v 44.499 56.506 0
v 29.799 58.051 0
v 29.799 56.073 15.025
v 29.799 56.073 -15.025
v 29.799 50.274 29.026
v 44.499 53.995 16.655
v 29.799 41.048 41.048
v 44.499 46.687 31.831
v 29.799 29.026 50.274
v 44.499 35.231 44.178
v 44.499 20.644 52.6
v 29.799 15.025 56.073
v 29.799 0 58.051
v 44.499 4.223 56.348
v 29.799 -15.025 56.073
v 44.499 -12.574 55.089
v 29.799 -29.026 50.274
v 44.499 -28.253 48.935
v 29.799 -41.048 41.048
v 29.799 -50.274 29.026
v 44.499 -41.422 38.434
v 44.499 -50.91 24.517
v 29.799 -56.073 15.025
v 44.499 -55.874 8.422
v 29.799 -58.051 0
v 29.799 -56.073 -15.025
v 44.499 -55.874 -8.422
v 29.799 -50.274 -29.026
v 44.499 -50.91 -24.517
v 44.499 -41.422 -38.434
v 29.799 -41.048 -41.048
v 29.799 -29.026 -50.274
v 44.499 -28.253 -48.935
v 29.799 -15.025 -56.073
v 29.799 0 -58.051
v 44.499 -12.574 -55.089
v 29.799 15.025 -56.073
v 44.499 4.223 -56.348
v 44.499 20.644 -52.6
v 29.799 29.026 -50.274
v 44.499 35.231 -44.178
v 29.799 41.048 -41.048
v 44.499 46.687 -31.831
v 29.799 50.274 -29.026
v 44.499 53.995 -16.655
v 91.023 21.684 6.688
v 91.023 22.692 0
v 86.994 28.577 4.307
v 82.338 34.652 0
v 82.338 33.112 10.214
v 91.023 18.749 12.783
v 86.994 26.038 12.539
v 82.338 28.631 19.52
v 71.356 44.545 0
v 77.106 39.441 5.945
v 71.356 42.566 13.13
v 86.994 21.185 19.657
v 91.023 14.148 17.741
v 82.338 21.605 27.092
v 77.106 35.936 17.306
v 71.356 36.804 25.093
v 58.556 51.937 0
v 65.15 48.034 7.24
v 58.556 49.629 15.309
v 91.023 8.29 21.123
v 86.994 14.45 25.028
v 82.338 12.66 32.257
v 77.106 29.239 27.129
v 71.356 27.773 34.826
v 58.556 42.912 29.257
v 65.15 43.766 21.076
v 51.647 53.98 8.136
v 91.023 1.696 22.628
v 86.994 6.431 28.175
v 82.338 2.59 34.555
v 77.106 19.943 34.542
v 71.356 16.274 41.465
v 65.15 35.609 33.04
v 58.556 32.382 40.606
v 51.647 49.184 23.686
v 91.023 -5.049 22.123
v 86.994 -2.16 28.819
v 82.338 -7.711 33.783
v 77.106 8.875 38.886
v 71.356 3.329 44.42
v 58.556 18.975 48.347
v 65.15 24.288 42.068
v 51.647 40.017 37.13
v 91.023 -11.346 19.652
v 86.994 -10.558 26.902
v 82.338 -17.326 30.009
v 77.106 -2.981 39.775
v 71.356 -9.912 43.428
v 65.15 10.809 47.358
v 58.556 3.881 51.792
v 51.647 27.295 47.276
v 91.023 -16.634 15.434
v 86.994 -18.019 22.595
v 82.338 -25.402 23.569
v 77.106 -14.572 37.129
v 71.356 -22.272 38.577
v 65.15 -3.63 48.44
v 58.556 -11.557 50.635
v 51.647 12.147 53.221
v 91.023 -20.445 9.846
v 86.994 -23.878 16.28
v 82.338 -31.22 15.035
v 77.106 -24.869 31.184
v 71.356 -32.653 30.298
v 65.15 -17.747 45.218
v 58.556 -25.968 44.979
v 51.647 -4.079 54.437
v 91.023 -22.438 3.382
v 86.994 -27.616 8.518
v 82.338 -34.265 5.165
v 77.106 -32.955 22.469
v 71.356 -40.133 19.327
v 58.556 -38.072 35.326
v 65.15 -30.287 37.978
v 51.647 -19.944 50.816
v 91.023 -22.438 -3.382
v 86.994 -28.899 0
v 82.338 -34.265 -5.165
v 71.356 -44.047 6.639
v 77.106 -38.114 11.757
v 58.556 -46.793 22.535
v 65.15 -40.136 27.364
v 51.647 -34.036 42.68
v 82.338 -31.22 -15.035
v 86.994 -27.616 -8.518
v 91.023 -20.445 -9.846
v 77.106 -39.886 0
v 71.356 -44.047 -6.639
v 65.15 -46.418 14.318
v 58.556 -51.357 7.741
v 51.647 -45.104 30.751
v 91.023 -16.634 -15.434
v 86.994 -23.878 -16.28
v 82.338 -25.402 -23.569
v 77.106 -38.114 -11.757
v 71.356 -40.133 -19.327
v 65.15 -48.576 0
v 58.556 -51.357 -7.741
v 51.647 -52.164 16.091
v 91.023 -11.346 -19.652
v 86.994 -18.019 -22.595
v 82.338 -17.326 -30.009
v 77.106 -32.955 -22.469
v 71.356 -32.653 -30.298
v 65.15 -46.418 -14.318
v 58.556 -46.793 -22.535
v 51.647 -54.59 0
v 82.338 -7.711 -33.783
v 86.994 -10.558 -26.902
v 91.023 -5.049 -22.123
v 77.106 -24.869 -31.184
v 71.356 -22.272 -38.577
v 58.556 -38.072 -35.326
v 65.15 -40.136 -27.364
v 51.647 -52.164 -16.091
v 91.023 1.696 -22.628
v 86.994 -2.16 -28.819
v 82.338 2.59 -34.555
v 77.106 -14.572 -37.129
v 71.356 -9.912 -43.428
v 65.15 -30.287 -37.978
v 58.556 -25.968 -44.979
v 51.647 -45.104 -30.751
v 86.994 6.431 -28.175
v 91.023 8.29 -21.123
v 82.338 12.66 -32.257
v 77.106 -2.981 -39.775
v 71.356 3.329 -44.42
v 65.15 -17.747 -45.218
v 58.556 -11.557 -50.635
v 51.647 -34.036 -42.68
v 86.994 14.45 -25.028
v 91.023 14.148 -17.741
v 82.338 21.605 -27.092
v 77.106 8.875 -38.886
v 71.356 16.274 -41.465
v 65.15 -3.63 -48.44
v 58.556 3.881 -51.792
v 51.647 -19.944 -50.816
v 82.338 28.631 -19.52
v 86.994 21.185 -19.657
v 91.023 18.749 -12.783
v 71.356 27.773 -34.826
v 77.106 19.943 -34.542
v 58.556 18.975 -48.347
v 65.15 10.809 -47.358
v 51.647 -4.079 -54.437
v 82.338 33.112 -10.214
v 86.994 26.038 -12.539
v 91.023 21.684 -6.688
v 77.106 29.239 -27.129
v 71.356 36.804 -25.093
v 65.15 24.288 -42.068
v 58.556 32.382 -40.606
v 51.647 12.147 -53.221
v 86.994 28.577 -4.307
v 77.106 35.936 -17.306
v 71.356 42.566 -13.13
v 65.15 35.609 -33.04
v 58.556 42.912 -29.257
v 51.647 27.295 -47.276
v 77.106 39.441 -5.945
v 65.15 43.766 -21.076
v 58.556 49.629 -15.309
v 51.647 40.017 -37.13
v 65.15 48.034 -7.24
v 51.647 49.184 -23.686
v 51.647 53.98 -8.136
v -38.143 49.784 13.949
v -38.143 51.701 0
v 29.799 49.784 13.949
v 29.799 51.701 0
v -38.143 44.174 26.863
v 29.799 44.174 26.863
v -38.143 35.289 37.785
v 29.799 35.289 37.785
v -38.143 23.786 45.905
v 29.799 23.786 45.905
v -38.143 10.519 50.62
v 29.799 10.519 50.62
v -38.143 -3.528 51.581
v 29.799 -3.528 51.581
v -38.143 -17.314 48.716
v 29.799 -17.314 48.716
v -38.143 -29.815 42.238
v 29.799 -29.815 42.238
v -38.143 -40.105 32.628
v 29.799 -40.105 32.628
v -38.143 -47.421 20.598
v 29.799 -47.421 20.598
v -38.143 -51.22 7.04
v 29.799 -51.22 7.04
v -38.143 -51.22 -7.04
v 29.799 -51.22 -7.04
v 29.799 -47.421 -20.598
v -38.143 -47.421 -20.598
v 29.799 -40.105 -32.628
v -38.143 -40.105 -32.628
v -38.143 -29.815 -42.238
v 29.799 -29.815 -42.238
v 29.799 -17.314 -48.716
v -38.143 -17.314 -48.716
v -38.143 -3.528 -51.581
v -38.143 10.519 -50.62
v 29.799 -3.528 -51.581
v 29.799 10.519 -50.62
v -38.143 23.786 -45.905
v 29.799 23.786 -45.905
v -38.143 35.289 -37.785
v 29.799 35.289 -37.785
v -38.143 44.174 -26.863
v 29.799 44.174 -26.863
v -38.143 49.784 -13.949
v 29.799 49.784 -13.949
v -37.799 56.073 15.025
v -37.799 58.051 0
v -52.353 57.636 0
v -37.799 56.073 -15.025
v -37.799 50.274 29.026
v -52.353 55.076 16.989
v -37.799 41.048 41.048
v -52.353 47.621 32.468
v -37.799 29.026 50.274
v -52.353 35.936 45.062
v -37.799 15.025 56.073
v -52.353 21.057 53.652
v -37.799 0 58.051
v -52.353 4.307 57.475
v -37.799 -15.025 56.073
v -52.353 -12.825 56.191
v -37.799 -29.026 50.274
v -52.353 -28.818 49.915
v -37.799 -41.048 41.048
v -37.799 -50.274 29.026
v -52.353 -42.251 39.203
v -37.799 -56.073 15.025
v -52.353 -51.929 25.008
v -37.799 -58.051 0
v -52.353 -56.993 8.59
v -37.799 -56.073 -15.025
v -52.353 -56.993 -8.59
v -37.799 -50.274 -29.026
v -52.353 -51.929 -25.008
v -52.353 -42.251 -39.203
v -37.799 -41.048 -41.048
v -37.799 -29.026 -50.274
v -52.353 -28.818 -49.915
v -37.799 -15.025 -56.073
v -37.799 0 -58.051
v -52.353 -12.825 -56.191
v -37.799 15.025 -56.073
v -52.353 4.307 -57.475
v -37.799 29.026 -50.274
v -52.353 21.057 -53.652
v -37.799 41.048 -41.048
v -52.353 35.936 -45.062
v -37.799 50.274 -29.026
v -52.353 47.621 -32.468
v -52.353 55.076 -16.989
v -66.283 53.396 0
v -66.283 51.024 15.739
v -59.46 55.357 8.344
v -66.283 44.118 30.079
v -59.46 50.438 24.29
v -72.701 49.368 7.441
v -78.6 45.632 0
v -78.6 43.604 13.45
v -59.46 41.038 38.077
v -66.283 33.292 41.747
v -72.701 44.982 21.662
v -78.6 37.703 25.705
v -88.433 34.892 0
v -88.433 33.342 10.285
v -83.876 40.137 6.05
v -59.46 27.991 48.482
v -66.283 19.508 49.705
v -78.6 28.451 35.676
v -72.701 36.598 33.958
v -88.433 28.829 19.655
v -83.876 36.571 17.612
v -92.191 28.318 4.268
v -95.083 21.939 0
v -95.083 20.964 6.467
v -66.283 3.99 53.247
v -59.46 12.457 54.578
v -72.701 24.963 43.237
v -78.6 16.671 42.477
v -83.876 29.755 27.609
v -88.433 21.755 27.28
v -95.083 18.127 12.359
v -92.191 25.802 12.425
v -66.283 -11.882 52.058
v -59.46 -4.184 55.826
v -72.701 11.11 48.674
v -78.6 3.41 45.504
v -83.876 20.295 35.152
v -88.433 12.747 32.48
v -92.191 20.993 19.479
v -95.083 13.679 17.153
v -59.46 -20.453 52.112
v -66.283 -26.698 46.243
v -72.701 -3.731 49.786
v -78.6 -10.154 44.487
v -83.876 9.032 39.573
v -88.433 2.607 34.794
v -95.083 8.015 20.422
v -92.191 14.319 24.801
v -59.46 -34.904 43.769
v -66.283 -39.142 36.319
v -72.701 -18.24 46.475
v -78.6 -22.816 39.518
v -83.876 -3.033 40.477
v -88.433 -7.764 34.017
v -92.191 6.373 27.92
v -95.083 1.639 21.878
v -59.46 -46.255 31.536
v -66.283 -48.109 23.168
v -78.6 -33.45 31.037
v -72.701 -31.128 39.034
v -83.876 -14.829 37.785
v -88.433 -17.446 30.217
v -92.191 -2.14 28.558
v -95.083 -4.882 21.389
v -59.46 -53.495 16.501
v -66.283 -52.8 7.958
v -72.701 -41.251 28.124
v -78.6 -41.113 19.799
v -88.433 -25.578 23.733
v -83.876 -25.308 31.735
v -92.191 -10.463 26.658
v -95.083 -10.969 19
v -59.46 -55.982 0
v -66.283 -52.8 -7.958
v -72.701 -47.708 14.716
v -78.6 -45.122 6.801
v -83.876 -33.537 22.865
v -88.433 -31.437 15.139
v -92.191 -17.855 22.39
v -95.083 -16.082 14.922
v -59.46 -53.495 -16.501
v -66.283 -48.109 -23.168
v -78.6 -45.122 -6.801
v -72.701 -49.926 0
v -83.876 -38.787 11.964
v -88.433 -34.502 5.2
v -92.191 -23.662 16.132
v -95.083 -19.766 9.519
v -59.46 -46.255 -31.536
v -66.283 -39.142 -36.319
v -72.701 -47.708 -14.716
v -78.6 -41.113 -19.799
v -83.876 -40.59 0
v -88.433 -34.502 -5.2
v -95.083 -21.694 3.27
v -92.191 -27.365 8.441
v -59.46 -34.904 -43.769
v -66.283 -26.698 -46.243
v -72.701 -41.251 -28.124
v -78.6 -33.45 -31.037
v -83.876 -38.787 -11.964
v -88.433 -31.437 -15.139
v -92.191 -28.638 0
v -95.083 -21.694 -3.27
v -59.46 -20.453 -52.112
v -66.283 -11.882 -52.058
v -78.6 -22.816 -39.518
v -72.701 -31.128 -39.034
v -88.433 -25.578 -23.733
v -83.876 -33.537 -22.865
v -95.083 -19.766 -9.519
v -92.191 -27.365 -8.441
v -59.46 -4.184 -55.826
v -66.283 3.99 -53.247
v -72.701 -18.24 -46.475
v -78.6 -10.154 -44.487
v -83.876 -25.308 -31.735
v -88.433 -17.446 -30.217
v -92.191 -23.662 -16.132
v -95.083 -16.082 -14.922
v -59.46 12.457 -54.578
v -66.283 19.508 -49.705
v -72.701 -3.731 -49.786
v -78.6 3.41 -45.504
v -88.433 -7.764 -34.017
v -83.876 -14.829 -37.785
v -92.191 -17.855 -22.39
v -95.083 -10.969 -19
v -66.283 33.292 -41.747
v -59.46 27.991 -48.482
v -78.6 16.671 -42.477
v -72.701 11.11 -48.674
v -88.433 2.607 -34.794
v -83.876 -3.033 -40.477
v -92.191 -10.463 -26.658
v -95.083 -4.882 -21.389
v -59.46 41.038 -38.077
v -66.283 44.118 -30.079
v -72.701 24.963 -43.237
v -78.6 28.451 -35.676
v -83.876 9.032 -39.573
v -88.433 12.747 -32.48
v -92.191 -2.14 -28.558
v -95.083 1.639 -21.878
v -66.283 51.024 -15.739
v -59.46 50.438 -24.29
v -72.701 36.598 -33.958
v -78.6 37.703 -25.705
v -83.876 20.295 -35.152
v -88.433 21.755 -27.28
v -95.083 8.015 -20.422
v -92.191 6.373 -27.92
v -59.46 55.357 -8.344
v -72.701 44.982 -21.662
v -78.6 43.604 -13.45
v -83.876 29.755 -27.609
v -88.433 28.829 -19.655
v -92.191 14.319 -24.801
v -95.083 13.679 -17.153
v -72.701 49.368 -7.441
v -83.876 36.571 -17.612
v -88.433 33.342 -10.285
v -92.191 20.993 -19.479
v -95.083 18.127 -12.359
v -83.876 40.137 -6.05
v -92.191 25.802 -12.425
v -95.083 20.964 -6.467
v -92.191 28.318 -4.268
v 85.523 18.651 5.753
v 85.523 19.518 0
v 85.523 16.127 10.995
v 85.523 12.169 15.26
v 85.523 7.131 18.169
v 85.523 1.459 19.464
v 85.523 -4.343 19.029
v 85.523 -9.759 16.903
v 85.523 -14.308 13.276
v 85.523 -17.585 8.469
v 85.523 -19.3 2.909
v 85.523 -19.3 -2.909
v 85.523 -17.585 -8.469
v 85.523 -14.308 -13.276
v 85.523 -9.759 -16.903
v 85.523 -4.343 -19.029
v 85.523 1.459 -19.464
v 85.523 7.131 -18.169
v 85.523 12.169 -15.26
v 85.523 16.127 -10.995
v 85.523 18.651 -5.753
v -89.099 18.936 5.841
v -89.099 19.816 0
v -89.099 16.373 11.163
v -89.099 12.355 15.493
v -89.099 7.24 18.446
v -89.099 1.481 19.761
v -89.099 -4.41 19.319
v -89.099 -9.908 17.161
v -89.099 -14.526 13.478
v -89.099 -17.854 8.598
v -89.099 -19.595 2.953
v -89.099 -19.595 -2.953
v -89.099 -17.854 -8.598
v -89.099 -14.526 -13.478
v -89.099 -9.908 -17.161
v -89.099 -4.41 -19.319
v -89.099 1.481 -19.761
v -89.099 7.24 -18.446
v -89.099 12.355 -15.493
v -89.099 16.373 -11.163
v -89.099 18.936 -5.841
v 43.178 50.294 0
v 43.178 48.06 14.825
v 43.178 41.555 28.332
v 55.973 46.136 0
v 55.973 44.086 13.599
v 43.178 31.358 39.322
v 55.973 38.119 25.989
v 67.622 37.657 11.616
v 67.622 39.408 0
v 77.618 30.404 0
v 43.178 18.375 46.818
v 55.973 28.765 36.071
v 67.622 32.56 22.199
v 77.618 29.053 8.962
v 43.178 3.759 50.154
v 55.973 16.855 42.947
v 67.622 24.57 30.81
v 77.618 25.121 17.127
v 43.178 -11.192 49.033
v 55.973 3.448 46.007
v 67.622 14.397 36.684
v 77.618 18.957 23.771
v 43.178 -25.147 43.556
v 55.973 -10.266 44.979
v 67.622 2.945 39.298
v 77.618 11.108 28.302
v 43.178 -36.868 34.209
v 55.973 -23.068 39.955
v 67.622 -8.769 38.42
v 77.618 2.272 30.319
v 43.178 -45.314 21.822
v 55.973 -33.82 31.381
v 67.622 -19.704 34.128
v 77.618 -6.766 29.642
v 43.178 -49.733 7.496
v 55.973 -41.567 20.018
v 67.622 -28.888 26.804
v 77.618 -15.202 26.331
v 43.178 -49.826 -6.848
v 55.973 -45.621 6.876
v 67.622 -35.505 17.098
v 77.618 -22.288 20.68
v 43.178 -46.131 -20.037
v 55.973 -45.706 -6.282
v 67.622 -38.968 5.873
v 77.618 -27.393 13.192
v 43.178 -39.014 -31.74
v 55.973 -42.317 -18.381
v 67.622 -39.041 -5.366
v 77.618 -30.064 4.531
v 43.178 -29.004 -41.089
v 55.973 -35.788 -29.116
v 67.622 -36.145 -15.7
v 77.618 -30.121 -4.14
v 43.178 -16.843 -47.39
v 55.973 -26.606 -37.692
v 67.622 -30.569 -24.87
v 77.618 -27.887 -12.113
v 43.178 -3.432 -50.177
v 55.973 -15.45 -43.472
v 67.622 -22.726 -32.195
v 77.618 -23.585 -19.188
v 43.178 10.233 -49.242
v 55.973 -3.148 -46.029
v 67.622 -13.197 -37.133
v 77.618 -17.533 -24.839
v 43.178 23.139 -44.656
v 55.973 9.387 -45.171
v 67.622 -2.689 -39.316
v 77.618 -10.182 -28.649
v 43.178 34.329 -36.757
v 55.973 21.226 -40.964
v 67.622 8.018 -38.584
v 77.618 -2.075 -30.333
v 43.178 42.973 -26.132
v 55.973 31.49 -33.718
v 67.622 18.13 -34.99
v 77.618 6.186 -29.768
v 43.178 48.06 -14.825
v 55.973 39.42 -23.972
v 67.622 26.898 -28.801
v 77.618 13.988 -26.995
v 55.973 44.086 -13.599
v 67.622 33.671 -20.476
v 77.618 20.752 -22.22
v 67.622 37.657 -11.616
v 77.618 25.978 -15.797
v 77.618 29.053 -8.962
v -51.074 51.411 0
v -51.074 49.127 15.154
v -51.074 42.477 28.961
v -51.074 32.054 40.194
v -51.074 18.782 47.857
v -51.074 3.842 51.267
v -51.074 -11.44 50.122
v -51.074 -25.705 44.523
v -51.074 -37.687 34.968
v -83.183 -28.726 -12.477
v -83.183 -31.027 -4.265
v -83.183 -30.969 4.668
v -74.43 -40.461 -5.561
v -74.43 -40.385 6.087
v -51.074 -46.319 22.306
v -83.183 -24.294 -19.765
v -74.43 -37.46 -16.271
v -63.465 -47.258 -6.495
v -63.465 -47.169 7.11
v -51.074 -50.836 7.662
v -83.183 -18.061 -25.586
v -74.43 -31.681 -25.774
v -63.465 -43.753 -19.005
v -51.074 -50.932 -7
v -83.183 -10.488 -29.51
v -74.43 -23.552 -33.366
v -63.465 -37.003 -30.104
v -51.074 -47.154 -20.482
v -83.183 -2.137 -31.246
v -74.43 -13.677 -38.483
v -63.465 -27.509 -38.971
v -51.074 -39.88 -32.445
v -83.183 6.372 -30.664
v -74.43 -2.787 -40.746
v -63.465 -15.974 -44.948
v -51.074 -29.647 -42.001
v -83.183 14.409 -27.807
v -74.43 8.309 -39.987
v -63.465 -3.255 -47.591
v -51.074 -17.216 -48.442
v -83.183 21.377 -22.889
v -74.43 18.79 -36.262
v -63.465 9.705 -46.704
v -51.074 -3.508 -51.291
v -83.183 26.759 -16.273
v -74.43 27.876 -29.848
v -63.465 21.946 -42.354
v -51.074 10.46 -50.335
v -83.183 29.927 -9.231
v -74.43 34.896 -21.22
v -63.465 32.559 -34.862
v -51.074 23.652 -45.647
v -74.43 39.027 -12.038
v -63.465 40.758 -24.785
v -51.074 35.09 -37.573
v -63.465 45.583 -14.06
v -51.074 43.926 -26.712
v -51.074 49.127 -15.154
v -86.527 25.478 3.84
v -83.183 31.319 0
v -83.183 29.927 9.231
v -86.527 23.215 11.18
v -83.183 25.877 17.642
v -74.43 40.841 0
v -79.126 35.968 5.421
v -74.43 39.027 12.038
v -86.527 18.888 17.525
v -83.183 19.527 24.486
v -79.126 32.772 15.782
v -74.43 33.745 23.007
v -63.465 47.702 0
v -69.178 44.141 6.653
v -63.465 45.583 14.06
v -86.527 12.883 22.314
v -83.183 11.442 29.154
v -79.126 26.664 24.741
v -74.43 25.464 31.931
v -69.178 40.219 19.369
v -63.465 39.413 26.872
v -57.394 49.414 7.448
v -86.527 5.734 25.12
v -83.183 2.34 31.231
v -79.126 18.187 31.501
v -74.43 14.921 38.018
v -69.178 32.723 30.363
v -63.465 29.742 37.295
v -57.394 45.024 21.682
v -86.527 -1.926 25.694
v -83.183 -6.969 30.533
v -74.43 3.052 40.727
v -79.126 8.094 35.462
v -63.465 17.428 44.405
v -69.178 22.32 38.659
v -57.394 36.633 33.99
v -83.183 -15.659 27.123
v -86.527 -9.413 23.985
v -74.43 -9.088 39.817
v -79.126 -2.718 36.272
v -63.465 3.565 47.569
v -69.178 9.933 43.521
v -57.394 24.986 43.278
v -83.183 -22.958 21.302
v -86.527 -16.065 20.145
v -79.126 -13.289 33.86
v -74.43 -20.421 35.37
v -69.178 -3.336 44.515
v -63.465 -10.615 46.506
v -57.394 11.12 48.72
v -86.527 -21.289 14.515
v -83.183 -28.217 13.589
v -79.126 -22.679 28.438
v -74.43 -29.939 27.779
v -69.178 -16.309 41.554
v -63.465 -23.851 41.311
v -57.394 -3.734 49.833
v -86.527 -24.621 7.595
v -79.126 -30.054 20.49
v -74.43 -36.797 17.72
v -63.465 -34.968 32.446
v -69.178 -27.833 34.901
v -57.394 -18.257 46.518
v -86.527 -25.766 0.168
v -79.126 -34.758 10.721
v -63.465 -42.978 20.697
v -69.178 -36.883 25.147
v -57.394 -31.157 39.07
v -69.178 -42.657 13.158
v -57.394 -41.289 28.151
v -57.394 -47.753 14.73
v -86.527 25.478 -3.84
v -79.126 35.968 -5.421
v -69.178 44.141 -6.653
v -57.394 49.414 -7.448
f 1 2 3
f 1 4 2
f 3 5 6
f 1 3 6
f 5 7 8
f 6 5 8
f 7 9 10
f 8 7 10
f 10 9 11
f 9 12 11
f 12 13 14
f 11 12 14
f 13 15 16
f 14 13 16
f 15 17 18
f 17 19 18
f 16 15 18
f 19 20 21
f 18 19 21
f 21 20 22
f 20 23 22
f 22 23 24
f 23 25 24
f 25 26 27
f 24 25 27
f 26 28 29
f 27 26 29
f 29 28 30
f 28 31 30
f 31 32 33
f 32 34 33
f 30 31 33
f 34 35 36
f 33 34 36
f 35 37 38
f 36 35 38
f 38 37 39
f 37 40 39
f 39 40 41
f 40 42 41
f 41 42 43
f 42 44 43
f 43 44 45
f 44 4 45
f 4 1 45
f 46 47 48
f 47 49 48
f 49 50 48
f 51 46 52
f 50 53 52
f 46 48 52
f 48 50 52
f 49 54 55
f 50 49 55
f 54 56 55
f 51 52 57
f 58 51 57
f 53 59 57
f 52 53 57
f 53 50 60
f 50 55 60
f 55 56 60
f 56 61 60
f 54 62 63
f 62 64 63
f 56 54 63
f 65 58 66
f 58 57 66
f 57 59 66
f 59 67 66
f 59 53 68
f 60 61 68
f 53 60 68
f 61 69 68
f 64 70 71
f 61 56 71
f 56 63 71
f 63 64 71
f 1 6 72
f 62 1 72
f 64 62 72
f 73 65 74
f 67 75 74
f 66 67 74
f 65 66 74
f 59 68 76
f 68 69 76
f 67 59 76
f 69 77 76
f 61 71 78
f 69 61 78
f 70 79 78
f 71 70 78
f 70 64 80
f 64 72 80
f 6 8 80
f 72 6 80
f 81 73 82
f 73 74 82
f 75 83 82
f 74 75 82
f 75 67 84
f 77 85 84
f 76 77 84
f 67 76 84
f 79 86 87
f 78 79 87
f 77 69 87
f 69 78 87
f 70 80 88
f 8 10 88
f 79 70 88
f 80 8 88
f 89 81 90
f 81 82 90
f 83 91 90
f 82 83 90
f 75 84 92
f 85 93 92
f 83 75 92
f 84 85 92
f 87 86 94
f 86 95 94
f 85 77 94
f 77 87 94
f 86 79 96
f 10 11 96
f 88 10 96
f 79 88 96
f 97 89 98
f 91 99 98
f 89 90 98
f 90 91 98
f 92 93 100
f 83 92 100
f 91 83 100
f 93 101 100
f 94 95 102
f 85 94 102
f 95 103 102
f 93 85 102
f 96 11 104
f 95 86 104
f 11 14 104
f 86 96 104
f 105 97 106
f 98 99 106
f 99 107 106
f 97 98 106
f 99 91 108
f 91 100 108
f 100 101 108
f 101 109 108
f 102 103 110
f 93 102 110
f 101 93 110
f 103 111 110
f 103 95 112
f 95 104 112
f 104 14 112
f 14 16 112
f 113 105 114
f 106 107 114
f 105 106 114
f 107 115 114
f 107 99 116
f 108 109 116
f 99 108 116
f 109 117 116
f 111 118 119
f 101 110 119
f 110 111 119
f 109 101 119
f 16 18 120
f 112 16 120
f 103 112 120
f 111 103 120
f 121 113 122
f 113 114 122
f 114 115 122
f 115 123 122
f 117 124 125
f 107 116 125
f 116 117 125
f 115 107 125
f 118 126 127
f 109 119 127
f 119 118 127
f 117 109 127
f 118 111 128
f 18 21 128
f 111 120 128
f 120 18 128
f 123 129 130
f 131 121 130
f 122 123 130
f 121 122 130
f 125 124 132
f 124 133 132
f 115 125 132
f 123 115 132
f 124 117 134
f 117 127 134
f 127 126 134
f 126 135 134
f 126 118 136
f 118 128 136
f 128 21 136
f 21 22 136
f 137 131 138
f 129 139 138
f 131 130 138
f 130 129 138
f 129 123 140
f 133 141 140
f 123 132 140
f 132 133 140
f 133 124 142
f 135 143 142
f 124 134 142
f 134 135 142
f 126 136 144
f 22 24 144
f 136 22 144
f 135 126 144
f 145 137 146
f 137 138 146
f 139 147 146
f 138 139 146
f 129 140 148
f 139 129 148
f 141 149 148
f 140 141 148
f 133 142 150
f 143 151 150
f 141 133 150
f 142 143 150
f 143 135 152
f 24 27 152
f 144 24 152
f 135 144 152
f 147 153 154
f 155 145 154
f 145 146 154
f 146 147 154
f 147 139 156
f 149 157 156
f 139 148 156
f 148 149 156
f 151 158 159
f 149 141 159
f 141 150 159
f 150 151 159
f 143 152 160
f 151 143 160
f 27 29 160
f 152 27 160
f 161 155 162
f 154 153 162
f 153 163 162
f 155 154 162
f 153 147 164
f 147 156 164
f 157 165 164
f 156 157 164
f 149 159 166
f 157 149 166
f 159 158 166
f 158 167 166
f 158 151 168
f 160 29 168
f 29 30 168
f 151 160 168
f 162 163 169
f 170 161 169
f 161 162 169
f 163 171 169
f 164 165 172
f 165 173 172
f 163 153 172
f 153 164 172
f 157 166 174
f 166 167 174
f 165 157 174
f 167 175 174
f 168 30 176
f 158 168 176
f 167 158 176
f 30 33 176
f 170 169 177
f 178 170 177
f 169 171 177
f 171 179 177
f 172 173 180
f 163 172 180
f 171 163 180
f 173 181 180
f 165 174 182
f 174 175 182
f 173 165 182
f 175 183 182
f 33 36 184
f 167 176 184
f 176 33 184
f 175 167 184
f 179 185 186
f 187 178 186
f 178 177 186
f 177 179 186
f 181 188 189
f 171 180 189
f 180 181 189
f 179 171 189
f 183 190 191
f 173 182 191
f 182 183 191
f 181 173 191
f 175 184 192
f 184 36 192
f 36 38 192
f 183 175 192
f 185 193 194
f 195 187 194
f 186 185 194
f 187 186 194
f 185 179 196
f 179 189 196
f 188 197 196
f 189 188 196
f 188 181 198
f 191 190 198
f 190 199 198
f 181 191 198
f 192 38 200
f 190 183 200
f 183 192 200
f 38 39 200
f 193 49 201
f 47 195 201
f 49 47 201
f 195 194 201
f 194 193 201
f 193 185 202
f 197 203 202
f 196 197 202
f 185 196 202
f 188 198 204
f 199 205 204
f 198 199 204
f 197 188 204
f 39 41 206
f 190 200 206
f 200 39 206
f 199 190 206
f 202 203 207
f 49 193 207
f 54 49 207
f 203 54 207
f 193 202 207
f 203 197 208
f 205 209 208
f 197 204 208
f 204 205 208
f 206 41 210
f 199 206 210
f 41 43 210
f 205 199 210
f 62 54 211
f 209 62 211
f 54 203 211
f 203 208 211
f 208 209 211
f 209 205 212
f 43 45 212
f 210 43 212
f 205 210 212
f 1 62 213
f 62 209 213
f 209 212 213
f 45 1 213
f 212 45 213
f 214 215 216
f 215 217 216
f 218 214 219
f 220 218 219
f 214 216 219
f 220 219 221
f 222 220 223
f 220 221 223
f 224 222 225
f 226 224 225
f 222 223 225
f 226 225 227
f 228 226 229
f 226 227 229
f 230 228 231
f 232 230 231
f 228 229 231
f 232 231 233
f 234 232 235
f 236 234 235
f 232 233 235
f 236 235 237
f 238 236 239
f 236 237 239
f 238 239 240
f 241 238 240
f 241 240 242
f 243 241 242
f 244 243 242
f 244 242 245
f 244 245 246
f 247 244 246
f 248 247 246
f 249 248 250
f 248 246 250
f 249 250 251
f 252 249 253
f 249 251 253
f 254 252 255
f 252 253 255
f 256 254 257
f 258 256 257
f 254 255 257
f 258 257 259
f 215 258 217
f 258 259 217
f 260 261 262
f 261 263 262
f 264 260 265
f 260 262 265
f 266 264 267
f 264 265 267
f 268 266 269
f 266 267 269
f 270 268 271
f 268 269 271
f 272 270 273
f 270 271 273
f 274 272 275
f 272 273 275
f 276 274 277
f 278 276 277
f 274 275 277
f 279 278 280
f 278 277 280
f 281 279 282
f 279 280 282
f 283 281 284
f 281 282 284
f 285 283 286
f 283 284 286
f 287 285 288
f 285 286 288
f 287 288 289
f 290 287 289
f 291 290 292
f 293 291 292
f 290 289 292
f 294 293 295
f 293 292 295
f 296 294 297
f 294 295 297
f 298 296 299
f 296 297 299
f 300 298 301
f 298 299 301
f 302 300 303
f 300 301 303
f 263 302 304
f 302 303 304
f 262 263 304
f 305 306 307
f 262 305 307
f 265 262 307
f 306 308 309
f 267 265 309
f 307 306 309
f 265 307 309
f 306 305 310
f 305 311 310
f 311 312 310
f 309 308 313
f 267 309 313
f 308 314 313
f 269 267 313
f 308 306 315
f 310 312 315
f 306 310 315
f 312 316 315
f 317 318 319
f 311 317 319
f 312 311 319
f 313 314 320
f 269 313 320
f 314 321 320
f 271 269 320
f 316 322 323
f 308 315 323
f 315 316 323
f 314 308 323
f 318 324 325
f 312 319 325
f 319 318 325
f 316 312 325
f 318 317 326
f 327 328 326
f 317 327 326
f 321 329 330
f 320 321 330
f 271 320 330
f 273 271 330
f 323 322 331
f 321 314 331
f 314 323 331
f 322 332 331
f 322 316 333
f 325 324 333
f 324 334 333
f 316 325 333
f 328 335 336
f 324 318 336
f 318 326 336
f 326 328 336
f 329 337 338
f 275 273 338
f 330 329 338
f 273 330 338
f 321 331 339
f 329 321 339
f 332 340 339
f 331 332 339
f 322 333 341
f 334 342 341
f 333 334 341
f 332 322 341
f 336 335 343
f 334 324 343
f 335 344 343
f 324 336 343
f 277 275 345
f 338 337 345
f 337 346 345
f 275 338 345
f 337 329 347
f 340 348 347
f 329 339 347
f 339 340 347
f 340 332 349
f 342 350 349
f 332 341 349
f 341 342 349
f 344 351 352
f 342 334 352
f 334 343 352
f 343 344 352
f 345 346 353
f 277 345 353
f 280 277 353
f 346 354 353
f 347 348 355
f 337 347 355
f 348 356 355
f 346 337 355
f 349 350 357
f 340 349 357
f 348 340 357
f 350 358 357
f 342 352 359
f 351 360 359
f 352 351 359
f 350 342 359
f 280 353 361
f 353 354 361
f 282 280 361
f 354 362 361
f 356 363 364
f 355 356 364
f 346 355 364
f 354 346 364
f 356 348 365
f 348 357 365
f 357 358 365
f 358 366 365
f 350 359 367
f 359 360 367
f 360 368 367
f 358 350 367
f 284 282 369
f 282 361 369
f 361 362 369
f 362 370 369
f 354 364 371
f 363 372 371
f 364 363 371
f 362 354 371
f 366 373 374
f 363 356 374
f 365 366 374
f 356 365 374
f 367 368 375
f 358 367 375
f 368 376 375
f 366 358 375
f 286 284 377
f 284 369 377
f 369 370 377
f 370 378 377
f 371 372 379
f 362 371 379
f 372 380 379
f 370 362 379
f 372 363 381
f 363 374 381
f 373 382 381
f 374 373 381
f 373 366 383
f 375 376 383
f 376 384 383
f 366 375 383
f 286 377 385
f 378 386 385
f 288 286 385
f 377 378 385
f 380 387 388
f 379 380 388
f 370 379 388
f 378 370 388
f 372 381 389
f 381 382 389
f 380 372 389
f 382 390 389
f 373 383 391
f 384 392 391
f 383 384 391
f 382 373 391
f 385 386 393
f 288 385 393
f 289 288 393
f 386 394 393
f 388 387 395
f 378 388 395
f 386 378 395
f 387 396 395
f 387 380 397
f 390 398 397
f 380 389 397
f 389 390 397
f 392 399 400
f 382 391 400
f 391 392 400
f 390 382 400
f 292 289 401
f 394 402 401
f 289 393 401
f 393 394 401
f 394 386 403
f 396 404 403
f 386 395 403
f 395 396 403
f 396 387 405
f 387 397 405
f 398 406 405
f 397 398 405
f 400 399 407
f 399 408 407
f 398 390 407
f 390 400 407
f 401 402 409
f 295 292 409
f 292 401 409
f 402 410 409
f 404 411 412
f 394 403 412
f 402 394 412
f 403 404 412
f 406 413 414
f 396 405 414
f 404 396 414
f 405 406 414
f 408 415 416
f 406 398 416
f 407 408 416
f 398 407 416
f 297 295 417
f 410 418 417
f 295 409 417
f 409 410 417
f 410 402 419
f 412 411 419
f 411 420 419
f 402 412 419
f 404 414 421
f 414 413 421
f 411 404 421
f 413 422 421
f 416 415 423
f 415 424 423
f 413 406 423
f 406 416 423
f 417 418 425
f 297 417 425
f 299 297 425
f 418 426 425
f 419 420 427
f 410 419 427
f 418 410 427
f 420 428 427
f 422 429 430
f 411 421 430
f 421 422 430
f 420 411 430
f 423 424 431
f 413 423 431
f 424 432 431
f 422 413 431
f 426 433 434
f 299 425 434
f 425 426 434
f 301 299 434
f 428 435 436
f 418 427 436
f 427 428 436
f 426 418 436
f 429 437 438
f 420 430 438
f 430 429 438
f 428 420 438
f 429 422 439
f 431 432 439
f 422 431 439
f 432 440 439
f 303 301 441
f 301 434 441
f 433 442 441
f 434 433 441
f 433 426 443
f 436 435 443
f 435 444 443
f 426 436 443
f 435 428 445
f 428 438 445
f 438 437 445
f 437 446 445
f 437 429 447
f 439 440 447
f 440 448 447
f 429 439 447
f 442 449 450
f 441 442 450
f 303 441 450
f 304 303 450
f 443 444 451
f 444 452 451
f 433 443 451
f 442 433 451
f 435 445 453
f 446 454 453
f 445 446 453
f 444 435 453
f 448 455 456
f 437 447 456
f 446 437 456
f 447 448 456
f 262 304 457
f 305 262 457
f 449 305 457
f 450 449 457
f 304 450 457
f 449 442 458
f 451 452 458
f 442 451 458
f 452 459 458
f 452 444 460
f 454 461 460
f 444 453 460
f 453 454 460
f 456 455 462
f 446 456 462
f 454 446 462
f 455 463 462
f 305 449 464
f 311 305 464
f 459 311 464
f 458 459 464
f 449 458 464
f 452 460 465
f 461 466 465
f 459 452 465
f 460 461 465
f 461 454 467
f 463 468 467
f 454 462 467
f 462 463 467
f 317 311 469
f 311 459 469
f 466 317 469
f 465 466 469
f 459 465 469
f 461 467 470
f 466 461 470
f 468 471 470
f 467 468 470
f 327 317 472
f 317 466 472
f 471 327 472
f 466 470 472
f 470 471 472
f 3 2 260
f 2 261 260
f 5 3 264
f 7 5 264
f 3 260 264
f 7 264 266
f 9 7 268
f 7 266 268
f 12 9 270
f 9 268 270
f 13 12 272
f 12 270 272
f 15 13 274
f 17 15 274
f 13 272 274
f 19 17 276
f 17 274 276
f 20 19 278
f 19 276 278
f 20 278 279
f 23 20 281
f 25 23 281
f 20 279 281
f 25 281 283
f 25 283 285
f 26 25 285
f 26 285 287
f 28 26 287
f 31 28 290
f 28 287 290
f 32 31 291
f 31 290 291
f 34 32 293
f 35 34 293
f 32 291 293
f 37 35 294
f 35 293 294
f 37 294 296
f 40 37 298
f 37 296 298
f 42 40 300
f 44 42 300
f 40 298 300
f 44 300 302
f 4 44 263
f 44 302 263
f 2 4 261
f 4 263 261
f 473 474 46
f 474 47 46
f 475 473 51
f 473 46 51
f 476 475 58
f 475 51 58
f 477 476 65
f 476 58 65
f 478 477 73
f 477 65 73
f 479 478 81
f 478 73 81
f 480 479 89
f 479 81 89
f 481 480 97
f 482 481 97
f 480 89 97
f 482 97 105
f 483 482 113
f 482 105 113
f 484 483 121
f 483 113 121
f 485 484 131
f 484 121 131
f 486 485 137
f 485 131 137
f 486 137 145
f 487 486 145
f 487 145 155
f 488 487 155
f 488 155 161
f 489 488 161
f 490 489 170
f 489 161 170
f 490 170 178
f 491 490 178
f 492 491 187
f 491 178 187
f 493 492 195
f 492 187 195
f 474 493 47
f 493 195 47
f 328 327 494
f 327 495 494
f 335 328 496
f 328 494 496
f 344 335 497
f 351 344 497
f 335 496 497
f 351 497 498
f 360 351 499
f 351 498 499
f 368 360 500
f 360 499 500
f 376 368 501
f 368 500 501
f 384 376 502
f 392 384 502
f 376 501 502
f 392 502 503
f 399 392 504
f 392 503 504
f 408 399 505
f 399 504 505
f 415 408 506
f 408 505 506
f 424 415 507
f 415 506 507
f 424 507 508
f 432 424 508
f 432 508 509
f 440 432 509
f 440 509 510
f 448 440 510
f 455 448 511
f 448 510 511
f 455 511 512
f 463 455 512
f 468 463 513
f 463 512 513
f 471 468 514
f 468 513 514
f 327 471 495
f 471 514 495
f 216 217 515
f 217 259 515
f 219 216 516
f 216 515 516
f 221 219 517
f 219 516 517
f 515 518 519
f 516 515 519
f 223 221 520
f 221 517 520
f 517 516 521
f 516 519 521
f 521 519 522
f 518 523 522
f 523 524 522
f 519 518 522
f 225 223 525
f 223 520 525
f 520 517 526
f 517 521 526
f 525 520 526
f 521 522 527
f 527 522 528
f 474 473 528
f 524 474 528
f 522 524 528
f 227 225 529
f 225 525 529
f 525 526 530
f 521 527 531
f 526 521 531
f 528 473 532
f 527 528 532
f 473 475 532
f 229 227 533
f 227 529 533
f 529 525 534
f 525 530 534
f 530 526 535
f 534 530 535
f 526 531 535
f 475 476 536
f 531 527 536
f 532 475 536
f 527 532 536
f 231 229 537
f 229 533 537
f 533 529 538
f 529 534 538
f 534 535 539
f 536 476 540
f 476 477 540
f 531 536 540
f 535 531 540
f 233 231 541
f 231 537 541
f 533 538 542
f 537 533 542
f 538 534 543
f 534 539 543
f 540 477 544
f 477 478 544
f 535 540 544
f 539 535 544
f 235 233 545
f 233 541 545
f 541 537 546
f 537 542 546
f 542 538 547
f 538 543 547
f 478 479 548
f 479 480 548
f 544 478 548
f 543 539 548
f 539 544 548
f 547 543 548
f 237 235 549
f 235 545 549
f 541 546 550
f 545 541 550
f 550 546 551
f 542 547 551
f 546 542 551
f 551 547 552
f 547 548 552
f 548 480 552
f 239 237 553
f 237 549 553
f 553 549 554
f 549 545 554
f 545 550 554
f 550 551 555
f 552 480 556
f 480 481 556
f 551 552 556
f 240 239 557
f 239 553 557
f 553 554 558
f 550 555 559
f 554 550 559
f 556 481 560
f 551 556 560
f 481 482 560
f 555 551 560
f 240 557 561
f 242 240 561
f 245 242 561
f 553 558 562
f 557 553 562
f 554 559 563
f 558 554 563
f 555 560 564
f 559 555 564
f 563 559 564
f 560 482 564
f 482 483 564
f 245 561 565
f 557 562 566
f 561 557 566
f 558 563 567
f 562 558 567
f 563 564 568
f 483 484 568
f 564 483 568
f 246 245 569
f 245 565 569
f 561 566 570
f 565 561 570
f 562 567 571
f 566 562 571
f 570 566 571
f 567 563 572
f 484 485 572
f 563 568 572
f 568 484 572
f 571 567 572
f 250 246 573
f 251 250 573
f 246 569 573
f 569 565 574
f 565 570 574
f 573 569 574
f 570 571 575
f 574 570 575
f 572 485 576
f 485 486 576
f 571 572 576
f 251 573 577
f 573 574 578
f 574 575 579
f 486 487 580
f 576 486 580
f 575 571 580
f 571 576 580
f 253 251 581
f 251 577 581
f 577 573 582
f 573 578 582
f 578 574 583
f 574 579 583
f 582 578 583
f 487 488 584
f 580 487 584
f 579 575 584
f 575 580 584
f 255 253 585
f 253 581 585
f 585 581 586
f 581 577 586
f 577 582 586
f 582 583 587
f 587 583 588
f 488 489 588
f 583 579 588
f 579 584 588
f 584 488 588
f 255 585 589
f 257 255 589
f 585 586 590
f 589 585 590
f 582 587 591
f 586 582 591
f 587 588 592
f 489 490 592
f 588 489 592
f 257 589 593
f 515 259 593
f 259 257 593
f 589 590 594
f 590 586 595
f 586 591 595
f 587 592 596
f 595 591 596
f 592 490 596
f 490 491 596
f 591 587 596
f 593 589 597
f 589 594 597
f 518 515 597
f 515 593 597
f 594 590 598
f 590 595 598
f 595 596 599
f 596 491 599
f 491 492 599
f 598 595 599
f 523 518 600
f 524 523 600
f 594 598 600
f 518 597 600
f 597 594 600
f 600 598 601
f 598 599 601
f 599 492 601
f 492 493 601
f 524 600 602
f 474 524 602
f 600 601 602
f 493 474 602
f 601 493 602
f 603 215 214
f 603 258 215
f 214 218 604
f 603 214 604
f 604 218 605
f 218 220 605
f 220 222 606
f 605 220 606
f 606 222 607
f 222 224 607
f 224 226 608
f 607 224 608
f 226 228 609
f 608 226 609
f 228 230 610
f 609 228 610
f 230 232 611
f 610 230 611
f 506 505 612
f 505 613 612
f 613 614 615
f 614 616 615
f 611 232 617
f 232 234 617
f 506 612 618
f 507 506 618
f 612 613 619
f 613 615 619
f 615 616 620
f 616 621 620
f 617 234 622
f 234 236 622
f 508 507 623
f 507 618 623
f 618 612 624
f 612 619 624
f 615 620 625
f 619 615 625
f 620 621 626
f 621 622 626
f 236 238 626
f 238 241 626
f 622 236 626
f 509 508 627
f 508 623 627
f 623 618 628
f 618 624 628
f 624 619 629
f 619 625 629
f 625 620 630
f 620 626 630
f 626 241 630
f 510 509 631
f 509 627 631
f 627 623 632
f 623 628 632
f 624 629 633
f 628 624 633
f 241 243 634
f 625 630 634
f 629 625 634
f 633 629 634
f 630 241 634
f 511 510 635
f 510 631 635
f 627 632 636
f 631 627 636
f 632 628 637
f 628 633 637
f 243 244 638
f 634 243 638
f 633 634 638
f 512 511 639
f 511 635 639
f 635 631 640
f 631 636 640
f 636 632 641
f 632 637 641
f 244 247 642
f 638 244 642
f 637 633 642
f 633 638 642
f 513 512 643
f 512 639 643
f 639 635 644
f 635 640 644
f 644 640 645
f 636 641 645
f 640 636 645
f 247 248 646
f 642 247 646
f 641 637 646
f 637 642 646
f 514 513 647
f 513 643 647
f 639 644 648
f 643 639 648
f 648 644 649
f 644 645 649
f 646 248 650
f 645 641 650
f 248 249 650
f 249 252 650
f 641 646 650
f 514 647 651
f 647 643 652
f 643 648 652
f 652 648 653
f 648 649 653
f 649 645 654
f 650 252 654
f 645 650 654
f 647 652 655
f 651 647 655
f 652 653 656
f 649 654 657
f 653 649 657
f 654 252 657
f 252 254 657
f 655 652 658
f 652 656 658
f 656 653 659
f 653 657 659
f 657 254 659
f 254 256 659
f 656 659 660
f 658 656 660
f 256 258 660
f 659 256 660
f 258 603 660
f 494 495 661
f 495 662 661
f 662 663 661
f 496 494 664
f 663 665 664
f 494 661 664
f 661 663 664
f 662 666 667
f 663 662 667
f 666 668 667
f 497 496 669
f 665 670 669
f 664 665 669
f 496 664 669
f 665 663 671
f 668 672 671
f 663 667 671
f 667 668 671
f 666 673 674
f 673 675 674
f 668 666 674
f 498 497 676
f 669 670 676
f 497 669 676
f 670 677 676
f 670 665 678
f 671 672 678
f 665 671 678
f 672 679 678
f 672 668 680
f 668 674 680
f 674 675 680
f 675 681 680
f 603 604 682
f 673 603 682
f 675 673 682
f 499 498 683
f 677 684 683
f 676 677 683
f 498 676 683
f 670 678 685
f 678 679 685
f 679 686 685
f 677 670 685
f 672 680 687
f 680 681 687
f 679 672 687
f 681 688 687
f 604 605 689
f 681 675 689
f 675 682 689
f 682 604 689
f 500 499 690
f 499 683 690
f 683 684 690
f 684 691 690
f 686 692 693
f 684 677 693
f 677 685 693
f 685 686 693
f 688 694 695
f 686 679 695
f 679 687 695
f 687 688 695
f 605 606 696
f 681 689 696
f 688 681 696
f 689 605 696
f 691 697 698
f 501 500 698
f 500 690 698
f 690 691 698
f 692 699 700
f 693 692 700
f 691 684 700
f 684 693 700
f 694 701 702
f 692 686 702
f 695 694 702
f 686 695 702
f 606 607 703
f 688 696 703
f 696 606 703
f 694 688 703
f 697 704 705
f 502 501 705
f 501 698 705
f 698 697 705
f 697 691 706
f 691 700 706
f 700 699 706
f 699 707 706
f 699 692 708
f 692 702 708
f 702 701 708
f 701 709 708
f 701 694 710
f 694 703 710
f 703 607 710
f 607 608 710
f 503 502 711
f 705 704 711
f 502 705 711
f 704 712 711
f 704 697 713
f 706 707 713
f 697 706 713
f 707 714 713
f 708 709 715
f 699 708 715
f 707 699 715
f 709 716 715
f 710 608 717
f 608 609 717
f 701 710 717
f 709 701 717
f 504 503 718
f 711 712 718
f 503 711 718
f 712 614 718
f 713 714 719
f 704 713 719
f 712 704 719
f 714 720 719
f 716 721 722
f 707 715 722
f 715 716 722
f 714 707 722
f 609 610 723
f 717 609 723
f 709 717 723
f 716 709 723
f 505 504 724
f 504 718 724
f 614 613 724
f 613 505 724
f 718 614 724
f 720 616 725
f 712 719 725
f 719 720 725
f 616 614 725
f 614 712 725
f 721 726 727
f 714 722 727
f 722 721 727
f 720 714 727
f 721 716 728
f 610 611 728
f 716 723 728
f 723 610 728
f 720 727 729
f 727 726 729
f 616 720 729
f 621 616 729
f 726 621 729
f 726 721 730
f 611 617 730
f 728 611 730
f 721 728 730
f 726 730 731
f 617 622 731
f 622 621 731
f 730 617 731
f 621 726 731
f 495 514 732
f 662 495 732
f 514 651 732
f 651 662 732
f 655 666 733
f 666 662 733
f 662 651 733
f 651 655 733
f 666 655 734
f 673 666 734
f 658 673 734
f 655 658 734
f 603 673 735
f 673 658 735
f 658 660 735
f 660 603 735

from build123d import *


# Not quite as in the source:
# - ends of sketch curves that miss each other by under 0.0002 mm in the source are joined


with BuildPart() as f1:
    # F0 (on Top) → F1 (revolve)
    with BuildSketch(Plane.XY):
        with BuildLine():
            ThreePointArc((-89.0986546874, 19.8162570596), (-69.1779558985, 44.6400212025), (-38.1425693631, 51.7010614276))
            Line((-38.1425693631, 51.7010614276), (29.7988802195, 51.7010614276))
            ThreePointArc((29.7988802195, 51.7010614276), (61.97374073, 43.0773793158), (85.5227932334, 19.518269226))
            Line((85.5227932334, 19.518269226), (91.022959273, 22.6917042953))
            ThreePointArc((91.022959273, 22.6917042953), (65.1495240793, 48.5761897981), (29.7988802195, 58.0510627349))
            Line((29.7988802195, 58.0510627349), (-37.7985022652, 58.0510608852))
            ThreePointArc((-37.7985022652, 58.0510608852), (-72.7012317245, 49.9257206617), (-95.0833715048, 21.9389113347))
            Line((-95.0833715048, 21.9389113347), (-89.0986546874, 19.8162570596))
        make_face()
    revolve(axis=Axis((-4.6188272536, 0, 0), (1, 0, 0)))


solid = f1.part
